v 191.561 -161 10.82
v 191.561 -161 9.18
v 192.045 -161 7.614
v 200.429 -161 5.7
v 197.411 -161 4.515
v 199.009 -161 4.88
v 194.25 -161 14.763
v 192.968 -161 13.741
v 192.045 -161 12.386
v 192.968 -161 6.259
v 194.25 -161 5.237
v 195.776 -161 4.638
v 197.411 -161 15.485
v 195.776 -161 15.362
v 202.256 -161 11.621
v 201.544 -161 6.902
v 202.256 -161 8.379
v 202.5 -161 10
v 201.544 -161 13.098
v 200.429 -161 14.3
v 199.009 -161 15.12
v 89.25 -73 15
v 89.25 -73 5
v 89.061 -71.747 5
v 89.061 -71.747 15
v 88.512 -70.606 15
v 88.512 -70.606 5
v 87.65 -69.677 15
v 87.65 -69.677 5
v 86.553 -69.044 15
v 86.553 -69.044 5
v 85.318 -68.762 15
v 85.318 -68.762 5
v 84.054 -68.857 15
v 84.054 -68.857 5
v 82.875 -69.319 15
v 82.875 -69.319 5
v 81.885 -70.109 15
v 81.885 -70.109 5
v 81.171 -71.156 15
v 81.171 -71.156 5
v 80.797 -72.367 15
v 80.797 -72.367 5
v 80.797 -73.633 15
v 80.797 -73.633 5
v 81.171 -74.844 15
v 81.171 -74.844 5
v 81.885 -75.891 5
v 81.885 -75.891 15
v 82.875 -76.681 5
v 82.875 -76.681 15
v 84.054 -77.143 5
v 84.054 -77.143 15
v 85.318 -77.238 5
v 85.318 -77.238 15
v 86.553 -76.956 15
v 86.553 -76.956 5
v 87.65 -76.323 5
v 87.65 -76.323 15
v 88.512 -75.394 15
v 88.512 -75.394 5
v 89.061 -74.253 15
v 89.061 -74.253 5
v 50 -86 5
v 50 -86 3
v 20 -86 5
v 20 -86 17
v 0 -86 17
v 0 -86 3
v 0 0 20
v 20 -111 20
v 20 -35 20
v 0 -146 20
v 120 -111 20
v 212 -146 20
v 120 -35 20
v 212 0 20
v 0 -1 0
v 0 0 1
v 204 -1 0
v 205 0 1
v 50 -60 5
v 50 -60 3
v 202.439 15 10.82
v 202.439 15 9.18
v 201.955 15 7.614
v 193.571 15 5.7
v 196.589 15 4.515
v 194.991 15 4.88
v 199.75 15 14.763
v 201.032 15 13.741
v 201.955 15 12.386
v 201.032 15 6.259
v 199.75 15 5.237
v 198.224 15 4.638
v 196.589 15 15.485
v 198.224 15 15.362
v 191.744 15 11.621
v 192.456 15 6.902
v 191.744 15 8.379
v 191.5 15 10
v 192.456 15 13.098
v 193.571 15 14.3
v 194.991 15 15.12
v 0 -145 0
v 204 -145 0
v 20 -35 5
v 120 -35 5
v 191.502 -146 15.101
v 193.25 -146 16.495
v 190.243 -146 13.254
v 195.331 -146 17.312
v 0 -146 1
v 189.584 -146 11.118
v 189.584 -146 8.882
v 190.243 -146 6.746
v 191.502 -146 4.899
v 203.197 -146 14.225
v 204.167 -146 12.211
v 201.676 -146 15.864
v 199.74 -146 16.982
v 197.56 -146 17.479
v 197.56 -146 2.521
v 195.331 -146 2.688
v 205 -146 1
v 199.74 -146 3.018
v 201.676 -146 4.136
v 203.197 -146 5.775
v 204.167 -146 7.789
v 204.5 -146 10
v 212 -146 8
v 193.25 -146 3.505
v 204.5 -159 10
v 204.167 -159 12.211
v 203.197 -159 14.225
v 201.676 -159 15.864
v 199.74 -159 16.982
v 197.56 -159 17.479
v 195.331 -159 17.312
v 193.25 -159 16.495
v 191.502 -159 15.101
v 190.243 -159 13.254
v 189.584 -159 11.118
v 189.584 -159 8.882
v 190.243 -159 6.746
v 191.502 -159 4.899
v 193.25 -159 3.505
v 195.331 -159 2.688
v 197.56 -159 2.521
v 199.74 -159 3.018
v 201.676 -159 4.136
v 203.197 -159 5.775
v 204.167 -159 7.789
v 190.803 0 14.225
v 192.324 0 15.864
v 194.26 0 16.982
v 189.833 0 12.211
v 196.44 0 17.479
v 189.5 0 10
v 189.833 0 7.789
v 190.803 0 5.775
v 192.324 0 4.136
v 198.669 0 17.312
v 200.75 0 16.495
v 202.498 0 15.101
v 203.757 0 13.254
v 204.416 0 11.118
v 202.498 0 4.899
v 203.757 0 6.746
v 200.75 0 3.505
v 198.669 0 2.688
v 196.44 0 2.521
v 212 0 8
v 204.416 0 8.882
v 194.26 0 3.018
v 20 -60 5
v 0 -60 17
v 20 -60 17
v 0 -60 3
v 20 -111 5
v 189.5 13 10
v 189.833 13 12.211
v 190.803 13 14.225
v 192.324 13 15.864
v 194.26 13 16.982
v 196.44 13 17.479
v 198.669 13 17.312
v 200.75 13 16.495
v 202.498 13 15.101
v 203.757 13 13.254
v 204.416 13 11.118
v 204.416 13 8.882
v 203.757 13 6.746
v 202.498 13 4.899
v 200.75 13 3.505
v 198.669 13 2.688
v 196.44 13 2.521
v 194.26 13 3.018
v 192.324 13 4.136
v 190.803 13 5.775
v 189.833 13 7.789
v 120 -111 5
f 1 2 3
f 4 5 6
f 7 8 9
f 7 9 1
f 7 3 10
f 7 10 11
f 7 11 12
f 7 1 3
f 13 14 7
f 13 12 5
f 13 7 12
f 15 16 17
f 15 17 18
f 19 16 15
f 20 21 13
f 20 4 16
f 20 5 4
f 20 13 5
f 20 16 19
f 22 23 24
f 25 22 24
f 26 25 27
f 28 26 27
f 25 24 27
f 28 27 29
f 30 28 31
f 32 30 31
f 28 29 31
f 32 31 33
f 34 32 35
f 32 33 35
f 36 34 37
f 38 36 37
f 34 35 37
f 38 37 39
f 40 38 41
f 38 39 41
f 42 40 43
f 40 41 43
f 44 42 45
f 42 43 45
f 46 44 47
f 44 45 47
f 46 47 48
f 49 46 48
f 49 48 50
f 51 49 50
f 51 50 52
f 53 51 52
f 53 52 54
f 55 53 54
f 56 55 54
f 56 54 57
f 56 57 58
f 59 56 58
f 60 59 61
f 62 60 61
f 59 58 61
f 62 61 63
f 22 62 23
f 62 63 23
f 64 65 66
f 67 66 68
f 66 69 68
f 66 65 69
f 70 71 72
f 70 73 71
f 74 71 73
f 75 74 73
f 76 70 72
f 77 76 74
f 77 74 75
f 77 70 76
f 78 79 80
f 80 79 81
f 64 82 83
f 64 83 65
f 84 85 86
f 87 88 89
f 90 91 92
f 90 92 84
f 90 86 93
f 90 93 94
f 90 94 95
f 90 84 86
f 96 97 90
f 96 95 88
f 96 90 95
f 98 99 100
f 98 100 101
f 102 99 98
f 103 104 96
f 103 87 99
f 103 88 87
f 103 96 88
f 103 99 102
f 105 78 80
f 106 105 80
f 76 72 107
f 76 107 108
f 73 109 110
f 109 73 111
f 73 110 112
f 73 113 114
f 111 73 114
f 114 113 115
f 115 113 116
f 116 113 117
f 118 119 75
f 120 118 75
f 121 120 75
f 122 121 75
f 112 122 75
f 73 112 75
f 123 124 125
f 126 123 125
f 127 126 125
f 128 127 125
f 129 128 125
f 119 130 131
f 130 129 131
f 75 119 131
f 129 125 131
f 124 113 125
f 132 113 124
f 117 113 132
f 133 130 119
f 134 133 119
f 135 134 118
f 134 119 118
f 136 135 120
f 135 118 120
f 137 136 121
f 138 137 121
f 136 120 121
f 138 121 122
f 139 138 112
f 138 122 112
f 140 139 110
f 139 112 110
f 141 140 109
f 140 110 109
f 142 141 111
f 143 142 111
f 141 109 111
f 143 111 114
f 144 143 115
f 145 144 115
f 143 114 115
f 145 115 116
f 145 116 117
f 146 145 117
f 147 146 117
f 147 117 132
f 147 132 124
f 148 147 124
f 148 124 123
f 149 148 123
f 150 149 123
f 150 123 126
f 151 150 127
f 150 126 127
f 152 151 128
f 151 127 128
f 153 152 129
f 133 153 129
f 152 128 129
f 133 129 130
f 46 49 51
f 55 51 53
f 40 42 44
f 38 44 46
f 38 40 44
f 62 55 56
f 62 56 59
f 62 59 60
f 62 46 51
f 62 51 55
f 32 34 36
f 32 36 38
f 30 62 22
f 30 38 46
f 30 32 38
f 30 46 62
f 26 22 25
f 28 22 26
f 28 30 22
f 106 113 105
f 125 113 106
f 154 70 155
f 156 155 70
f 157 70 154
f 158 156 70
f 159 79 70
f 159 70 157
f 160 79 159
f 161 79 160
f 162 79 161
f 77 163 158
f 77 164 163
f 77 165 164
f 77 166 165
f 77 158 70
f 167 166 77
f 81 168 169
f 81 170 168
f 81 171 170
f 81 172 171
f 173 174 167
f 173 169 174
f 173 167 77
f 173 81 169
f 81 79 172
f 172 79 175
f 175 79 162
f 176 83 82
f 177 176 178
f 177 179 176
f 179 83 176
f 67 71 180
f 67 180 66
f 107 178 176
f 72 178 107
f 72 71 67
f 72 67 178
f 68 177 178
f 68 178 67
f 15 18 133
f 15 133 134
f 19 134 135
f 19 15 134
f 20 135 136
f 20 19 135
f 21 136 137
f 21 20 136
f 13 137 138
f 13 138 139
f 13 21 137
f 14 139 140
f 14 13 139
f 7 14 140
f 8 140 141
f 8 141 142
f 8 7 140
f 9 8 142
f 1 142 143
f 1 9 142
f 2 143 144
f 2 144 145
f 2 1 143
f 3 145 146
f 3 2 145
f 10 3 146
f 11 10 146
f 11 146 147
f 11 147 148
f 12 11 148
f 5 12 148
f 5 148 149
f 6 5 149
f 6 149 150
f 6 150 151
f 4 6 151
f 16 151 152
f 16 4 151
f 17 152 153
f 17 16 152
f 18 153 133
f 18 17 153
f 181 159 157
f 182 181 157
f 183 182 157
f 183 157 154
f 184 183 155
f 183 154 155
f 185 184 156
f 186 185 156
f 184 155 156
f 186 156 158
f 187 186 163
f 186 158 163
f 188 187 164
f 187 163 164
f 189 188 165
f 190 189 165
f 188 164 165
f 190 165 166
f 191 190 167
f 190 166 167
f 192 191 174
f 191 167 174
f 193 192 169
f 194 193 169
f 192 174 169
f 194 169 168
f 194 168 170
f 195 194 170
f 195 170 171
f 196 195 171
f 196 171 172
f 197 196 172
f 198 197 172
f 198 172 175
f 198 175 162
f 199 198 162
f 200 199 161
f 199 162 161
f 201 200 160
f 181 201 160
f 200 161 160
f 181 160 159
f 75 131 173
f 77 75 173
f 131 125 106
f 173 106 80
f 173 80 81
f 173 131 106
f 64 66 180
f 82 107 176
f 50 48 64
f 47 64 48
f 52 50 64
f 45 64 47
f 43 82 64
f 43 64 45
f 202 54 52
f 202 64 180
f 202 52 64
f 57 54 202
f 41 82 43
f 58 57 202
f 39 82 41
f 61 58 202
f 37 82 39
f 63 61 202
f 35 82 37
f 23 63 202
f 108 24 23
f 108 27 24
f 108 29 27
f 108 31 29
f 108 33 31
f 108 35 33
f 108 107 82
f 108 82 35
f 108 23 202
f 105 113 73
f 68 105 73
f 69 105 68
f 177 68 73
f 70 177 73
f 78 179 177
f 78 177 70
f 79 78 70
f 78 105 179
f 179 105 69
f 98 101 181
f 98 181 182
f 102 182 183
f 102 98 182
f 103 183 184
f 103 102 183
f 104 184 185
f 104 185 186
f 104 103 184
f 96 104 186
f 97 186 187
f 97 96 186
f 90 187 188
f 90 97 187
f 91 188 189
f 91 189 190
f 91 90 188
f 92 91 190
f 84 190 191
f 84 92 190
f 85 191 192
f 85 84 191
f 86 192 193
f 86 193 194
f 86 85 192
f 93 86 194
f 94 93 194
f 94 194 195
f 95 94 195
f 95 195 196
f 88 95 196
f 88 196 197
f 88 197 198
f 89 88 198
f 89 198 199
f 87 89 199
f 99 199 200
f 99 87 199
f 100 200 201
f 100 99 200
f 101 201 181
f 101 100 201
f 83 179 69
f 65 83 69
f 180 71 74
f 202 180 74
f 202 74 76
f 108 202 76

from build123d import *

# Parameters (mm, degrees)
SKETCH_W        = 212
SKETCH_H        = 146
PAD_DEPTH       = 20
SKETCH001_R     = 7.5
PAD001_DEPTH    = 15
SKETCH002_R     = 7.5
PAD002_DEPTH    = 15
CHAMFER_SIZE    = 2
CHAMFER001_SIZE = 2
CHAMFER002_SIZE = 8
SKETCH003_W     = 26
SKETCH003_H     = 14
POCKET_DEPTH    = 50
SKETCH004_W     = 100
SKETCH004_H     = 76
POCKET001_DEPTH = 15
CHAMFER003_SIZE = 1
CHAMFER004_SIZE = 1
SKETCH005_R     = 4.25
PAD003_DEPTH    = 10


with BuildPart() as part:
    # Sketch → Pad (new body)
    with BuildSketch(Plane.XY):
        with Locations((106, -73)):
            Rectangle(SKETCH_W, SKETCH_H)
    extrude(amount=PAD_DEPTH)

    # Sketch001 (on Face2 of Pad) → Pad001 (join)
    with BuildSketch(Plane.XZ.offset(146)):
        with Locations((197, 10)):
            Circle(SKETCH001_R)
    extrude(amount=PAD001_DEPTH)

    # Sketch002 (on Face2 of Pad001) → Pad002 (join)
    with BuildSketch(Plane(origin=(0, 0, 0), x_dir=(-1, 0, 0), z_dir=(0, 1, 0))):
        with Locations((-197, 10)):
            Circle(SKETCH002_R)
    extrude(amount=PAD002_DEPTH)

    # Chamfer
    chamfer_edges = [part.edges().sort_by_distance(p)[0] for p in [
        (204.5, 15, 10),
    ]]
    chamfer(chamfer_edges, length=CHAMFER_SIZE)

    # Chamfer001
    chamfer001_edges = [part.edges().sort_by_distance(p)[0] for p in [
        (189.5, -161, 10),
    ]]
    chamfer(chamfer001_edges, length=CHAMFER001_SIZE)

    # Chamfer002
    chamfer002_edges = [part.edges().sort_by_distance(p)[0] for p in [
        (212, -73, 0),
    ]]
    chamfer(chamfer002_edges, length=CHAMFER002_SIZE)

    # Sketch003 (on Face4 of Chamfer002) → Pocket (cut)
    with BuildSketch(Plane(origin=(0, 0, 0), x_dir=(0, -1, 0), z_dir=(-1, 0, 0))):
        with Locations((73, 10)):
            Rectangle(SKETCH003_W, SKETCH003_H)
    extrude(amount=-POCKET_DEPTH, mode=Mode.SUBTRACT)

    # Sketch004 (on Face6 of Pocket) → Pocket001 (cut)
    with BuildSketch(Plane.XY.offset(20)):
        with Locations((70, -73)):
            Rectangle(SKETCH004_W, SKETCH004_H)
    extrude(amount=-POCKET001_DEPTH, mode=Mode.SUBTRACT)

    # Chamfer003
    chamfer003_edges = [part.edges().sort_by_distance(p)[0] for p in [
        (102, 0, 0),
    ]]
    chamfer(chamfer003_edges, length=CHAMFER003_SIZE)

    # Chamfer004
    chamfer004_edges = [part.edges().sort_by_distance(p)[0] for p in [
        (102, -146, 0),
    ]]
    chamfer(chamfer004_edges, length=CHAMFER004_SIZE)

    # Sketch005 (on Face20 of Chamfer004) → Pad003 (join)
    with BuildSketch(Plane.XY.offset(5)):
        with Locations((85, -73)):
            Circle(SKETCH005_R)
    extrude(amount=PAD003_DEPTH)


solid = part.part
